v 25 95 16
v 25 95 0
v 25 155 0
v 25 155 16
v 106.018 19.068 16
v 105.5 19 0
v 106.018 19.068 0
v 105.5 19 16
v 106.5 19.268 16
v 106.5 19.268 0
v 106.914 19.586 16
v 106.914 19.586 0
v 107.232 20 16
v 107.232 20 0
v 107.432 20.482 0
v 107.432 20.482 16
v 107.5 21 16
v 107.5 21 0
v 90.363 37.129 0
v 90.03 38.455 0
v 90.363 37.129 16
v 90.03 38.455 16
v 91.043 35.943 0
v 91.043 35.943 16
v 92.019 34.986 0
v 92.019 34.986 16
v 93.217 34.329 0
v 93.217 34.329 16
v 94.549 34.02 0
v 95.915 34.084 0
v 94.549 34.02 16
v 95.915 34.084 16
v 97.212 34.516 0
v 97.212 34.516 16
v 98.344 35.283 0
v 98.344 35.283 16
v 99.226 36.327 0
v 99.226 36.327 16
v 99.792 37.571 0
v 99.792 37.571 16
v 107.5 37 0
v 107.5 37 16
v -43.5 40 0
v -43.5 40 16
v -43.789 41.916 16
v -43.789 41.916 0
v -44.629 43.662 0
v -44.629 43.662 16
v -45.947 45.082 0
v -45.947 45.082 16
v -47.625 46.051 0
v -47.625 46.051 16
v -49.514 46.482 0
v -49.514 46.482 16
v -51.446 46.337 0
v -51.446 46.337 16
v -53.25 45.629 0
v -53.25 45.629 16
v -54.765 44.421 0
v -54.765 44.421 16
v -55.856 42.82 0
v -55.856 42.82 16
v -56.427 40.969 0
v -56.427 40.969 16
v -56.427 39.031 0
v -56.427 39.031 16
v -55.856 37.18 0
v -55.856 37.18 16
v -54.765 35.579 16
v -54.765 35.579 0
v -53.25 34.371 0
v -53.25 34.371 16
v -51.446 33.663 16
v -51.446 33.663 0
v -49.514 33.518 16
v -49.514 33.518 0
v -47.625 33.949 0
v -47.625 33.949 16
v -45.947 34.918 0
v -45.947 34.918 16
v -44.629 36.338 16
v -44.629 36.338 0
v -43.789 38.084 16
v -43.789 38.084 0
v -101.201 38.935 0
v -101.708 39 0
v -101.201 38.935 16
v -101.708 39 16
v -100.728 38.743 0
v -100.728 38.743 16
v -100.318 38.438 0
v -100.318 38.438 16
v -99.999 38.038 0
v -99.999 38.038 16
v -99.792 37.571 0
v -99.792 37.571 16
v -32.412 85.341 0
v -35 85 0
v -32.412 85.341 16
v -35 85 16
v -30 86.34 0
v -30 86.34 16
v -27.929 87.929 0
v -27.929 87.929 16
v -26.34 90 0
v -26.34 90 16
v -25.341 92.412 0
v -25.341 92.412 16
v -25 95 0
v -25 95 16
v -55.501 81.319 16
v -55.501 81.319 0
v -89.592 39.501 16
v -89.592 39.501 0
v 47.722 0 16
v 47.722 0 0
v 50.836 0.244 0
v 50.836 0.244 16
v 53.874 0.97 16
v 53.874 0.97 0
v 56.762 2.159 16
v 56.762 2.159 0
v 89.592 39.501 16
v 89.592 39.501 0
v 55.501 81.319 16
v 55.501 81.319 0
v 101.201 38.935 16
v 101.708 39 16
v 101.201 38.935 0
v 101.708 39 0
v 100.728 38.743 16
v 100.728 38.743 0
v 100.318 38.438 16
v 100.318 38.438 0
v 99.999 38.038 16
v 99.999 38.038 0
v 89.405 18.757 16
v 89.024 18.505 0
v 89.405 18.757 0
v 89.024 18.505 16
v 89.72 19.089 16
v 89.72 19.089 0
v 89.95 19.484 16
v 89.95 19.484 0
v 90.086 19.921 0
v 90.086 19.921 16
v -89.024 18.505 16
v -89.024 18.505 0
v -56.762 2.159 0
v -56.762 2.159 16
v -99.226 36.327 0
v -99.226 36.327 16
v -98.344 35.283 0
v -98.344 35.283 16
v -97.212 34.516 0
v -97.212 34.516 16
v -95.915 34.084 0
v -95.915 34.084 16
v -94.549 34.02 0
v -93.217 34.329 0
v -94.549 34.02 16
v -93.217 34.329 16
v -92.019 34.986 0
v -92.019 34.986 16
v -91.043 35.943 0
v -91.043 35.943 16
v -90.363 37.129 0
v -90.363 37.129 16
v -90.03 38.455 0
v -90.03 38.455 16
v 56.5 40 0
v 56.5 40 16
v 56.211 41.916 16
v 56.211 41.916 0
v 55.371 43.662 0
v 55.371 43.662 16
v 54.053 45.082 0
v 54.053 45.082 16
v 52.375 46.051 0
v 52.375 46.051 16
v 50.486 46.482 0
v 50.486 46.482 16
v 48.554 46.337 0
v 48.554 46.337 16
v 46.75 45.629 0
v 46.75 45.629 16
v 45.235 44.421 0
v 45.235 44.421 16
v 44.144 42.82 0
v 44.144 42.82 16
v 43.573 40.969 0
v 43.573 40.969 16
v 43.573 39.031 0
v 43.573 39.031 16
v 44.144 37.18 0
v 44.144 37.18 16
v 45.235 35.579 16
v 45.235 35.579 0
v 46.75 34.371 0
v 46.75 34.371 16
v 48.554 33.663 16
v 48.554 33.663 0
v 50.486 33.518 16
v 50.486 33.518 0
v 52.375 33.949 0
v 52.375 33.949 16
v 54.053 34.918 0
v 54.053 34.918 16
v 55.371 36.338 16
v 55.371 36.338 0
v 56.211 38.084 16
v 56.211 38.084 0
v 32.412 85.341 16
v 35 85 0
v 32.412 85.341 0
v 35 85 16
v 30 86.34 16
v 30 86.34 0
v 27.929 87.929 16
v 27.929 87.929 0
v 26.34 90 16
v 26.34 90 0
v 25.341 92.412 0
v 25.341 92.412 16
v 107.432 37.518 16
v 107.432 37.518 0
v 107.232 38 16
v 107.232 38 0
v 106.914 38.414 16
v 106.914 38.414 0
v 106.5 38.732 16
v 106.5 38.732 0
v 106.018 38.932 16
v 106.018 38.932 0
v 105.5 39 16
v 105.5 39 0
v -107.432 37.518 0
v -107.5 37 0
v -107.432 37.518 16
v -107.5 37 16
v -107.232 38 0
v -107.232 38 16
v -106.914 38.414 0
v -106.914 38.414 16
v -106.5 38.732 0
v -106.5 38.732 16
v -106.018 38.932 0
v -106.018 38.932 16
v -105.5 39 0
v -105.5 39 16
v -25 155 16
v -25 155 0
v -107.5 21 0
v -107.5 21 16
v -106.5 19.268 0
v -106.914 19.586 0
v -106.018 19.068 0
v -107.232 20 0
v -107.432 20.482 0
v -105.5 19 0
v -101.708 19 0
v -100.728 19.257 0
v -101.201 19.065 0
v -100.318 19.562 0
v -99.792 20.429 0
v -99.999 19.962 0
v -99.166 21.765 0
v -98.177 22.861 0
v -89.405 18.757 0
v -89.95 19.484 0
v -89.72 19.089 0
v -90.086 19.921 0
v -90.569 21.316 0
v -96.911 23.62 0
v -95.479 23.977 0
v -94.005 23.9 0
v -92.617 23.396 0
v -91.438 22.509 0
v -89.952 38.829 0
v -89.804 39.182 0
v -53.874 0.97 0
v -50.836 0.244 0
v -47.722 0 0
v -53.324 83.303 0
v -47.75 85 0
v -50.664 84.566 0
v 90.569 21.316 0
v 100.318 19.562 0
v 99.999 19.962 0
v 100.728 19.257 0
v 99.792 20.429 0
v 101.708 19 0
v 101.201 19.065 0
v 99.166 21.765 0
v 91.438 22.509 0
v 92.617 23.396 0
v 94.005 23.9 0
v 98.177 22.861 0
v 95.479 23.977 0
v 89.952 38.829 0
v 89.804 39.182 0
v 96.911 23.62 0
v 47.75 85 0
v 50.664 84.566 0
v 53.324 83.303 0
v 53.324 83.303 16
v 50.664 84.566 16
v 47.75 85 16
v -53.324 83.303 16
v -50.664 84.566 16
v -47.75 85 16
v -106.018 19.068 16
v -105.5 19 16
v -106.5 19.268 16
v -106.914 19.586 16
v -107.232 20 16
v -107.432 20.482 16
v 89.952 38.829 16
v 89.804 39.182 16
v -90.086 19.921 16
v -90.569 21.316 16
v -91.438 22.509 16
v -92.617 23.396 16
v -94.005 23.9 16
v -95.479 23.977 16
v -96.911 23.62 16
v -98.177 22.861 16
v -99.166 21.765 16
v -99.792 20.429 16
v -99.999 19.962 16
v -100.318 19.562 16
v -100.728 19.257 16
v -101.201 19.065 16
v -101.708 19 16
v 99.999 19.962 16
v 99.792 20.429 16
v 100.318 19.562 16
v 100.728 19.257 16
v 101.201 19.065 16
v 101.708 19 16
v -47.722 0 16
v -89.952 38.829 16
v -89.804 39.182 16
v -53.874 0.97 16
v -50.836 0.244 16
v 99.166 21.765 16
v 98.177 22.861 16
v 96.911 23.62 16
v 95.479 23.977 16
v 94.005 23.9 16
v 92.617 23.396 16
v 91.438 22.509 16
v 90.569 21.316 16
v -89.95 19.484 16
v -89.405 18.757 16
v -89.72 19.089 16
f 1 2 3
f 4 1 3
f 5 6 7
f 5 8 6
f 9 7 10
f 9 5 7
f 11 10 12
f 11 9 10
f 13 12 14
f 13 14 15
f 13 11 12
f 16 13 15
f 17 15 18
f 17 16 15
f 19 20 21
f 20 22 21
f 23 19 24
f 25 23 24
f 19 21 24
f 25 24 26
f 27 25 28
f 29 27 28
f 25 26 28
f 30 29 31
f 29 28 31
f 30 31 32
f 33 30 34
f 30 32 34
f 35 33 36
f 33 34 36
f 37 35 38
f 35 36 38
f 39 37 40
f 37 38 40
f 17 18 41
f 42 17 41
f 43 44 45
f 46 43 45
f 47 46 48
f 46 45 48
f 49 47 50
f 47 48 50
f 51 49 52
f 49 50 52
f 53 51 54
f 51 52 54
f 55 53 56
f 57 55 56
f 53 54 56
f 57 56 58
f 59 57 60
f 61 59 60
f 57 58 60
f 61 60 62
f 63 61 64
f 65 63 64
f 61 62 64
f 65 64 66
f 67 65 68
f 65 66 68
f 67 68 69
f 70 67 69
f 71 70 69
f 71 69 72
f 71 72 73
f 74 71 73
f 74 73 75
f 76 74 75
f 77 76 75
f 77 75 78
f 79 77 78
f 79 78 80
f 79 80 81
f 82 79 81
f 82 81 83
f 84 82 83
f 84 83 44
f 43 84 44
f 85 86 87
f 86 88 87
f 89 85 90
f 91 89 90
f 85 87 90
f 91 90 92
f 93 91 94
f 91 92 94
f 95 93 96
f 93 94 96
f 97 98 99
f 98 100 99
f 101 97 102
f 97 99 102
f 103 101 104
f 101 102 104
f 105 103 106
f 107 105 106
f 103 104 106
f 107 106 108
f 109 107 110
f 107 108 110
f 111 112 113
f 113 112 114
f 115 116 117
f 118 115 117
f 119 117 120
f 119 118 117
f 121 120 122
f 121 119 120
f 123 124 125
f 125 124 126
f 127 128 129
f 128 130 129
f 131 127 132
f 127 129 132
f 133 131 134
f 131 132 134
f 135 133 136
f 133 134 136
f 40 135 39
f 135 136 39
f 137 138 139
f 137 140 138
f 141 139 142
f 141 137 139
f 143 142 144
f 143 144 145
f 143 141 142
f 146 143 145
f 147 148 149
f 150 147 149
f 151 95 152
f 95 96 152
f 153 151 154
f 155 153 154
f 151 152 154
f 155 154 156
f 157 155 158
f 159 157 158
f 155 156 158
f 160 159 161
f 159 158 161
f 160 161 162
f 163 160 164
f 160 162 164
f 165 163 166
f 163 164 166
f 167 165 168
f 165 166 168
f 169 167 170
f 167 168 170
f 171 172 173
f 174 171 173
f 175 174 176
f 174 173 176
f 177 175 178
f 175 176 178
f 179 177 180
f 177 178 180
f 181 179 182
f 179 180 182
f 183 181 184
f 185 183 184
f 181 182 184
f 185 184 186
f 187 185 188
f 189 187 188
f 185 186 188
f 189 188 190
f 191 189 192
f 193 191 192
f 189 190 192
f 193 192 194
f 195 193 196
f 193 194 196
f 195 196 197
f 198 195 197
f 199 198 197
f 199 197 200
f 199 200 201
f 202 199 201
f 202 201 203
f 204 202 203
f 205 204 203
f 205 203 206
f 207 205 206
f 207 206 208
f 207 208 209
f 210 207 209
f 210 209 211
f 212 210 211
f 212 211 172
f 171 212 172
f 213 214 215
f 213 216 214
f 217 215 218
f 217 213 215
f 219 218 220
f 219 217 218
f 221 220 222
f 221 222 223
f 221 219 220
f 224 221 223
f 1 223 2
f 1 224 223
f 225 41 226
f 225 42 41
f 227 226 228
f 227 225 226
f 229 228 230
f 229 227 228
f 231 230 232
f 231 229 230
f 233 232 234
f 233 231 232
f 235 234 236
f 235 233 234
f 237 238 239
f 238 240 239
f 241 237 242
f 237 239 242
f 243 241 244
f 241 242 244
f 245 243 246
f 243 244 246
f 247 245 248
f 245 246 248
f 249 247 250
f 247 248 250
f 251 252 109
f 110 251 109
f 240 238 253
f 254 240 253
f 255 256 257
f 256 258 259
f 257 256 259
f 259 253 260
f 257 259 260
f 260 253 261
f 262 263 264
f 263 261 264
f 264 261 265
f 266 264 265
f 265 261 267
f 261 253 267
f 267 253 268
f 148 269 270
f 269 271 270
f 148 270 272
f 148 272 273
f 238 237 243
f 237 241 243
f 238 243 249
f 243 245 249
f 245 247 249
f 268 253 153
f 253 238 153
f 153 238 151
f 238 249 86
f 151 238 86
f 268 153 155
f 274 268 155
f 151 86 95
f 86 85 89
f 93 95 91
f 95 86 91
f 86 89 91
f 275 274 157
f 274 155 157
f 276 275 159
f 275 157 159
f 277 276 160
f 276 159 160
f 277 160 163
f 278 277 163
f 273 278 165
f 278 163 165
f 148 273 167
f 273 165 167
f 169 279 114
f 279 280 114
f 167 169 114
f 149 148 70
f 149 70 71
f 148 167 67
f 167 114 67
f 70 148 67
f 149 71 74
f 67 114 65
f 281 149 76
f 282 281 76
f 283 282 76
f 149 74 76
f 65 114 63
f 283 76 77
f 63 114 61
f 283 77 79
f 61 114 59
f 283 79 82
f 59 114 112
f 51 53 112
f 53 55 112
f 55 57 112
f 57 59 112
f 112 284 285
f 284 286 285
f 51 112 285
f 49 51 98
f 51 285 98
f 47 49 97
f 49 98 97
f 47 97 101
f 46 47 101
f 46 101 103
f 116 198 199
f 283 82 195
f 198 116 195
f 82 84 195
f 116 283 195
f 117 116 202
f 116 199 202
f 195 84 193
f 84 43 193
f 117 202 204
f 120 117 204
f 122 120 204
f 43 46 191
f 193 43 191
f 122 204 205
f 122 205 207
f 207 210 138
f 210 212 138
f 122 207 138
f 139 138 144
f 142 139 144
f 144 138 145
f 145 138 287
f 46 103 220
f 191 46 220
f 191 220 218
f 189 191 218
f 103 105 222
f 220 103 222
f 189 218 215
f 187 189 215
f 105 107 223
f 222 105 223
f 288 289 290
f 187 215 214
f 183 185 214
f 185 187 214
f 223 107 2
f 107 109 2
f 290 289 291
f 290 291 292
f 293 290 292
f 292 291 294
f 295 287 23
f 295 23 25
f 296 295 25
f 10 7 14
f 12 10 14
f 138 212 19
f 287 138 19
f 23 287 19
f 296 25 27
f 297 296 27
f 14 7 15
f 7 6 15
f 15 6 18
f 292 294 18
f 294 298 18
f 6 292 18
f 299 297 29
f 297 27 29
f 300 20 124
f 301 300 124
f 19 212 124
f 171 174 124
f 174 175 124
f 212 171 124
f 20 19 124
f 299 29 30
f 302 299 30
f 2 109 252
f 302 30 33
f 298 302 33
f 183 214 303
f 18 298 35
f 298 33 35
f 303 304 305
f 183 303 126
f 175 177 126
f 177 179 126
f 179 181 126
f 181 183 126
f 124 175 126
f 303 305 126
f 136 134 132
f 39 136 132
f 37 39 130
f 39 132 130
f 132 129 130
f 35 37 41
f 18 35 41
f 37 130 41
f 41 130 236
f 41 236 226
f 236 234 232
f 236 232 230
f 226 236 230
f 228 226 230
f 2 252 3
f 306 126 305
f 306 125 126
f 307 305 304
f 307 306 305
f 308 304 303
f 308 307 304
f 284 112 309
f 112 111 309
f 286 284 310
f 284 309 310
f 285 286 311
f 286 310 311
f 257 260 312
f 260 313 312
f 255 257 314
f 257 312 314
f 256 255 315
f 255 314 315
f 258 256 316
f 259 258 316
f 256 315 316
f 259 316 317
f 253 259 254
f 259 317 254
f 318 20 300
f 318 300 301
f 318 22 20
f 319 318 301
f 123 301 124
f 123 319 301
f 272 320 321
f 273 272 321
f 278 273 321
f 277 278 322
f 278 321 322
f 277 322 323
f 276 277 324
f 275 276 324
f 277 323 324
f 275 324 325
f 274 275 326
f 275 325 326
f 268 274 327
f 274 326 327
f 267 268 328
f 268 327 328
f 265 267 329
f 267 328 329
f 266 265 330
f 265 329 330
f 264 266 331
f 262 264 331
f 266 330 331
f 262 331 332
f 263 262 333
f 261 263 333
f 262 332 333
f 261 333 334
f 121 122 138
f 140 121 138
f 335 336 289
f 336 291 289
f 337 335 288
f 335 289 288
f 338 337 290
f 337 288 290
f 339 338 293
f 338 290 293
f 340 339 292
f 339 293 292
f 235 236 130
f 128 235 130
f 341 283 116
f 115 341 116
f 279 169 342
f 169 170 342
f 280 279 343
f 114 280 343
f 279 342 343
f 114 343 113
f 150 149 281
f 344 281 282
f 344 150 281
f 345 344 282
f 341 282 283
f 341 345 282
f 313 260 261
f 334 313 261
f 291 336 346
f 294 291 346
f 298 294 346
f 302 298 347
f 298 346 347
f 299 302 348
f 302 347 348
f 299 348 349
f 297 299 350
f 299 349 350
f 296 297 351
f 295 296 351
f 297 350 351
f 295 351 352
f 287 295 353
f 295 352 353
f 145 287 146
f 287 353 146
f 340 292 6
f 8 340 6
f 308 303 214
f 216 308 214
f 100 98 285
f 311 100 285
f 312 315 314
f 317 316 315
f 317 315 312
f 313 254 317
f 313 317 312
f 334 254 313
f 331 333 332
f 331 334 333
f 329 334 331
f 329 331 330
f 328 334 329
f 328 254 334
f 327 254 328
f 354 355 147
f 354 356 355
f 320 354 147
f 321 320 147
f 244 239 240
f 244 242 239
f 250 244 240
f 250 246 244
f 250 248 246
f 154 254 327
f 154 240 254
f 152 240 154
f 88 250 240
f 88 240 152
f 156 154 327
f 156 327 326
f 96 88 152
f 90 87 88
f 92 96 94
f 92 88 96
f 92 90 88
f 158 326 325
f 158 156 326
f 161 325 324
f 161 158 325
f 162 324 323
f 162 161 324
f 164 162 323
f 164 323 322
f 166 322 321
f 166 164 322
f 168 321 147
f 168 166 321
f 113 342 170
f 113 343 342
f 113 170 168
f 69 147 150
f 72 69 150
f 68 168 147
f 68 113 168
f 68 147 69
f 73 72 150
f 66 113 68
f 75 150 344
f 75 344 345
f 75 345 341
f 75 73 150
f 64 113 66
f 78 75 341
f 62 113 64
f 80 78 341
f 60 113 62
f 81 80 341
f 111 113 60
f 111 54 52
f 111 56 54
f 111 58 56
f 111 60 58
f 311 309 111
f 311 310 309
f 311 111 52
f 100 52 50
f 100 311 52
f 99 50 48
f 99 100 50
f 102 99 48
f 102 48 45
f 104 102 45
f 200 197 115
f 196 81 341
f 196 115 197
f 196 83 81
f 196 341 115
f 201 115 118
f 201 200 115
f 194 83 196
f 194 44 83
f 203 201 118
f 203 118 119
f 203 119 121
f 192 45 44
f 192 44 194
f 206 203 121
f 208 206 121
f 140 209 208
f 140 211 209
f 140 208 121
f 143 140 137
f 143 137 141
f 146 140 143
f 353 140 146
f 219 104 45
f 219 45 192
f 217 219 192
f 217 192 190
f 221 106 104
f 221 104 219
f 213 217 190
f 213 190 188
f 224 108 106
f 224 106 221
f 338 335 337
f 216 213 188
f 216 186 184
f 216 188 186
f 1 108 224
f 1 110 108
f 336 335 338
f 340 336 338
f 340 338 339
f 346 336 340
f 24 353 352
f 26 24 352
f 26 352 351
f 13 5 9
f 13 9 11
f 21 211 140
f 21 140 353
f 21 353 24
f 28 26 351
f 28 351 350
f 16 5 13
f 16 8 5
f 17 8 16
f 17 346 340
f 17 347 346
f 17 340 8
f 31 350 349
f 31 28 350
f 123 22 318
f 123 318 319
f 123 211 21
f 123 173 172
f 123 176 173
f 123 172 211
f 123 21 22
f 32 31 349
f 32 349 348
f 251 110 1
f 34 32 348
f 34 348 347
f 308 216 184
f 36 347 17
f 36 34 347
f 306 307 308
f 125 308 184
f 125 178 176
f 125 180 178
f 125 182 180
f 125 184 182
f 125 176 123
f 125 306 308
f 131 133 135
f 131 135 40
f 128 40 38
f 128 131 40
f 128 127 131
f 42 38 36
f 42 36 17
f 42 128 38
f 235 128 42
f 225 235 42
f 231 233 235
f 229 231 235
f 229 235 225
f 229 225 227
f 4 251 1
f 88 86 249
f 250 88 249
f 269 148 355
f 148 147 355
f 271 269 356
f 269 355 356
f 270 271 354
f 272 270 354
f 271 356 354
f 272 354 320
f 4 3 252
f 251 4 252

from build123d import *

# Parameters (mm, degrees)
EXTRUDE_3_DEPTH     = 16
SKETCH_8_R          = 5
CUT_EXTRUDE_3_DEPTH = 190.307289875
SKETCH_9_R          = 6.5
CUT_EXTRUDE_4_DEPTH = 190.307289875
FILLET_1_R          = 10
FILLET_2_R          = 20
FILLET_3_R          = 2
FILLET_4_R          = 10


with BuildPart() as part:
    # 草图1 → 凸台-拉伸3 (new body)
    with BuildSketch(Plane.XY):
        Polygon((52.5, 0), (90, 19), (107.5, 19), (107.5, 39), (90, 39), (52.5, 85), (25, 85), (25, 155), (-25, 155), (-25, 85), (-52.5, 85), (-90, 39), (-107.5, 39), (-107.5, 19), (-90, 19), (-52.5, 0), align=None)
    extrude(amount=EXTRUDE_3_DEPTH)

    # 草图8 → 切除-拉伸3 (cut, through all)
    with BuildSketch(Plane.XY.offset(16)):
        with Locations((-95, 39)):
            Circle(SKETCH_8_R)
        with Locations((-95, 19)):
            Circle(SKETCH_8_R)
        with Locations((95, 39)):
            Circle(SKETCH_8_R)
        with Locations((95, 19)):
            Circle(SKETCH_8_R)
    extrude(amount=-CUT_EXTRUDE_3_DEPTH, mode=Mode.SUBTRACT)

    # 草图9 → 切除-拉伸4 (cut, through all)
    with BuildSketch(Plane.XY.offset(16)):
        with Locations((-50, 40)):
            Circle(SKETCH_9_R)
        with Locations((50, 40)):
            Circle(SKETCH_9_R)
    extrude(amount=-CUT_EXTRUDE_4_DEPTH, mode=Mode.SUBTRACT)

    # 圆角1
    fillet_1_edges = [part.edges().sort_by_distance(p)[0] for p in [
        (-25, 85, 8),
        (25, 85, 8),
    ]]
    fillet(fillet_1_edges, radius=FILLET_1_R)

    # 圆角2
    fillet_2_edges = [part.edges().sort_by_distance(p)[0] for p in [
        (-52.5, 0, 8),
        (52.5, 0, 8),
    ]]
    fillet(fillet_2_edges, radius=FILLET_2_R)

    # 圆角3
    fillet_3_edges = [part.edges().sort_by_distance(p)[0] for p in [
        (-90, 19, 8),
        (-107.5, 19, 8),
        (-107.5, 39, 8),
        (-90, 39, 8),
        (90, 39, 8),
        (107.5, 39, 8),
        (107.5, 19, 8),
        (90, 19, 8),
        (-100, 19, 8),
        (100, 39, 8),
        (100, 19, 8),
        (-100, 39, 8),
    ]]
    fillet(fillet_3_edges, radius=FILLET_3_R)

    # 圆角4
    fillet_4_edges = [part.edges().sort_by_distance(p)[0] for p in [
        (-52.5, 85, 8),
        (52.5, 85, 8),
    ]]
    fillet(fillet_4_edges, radius=FILLET_4_R)


solid = part.part
